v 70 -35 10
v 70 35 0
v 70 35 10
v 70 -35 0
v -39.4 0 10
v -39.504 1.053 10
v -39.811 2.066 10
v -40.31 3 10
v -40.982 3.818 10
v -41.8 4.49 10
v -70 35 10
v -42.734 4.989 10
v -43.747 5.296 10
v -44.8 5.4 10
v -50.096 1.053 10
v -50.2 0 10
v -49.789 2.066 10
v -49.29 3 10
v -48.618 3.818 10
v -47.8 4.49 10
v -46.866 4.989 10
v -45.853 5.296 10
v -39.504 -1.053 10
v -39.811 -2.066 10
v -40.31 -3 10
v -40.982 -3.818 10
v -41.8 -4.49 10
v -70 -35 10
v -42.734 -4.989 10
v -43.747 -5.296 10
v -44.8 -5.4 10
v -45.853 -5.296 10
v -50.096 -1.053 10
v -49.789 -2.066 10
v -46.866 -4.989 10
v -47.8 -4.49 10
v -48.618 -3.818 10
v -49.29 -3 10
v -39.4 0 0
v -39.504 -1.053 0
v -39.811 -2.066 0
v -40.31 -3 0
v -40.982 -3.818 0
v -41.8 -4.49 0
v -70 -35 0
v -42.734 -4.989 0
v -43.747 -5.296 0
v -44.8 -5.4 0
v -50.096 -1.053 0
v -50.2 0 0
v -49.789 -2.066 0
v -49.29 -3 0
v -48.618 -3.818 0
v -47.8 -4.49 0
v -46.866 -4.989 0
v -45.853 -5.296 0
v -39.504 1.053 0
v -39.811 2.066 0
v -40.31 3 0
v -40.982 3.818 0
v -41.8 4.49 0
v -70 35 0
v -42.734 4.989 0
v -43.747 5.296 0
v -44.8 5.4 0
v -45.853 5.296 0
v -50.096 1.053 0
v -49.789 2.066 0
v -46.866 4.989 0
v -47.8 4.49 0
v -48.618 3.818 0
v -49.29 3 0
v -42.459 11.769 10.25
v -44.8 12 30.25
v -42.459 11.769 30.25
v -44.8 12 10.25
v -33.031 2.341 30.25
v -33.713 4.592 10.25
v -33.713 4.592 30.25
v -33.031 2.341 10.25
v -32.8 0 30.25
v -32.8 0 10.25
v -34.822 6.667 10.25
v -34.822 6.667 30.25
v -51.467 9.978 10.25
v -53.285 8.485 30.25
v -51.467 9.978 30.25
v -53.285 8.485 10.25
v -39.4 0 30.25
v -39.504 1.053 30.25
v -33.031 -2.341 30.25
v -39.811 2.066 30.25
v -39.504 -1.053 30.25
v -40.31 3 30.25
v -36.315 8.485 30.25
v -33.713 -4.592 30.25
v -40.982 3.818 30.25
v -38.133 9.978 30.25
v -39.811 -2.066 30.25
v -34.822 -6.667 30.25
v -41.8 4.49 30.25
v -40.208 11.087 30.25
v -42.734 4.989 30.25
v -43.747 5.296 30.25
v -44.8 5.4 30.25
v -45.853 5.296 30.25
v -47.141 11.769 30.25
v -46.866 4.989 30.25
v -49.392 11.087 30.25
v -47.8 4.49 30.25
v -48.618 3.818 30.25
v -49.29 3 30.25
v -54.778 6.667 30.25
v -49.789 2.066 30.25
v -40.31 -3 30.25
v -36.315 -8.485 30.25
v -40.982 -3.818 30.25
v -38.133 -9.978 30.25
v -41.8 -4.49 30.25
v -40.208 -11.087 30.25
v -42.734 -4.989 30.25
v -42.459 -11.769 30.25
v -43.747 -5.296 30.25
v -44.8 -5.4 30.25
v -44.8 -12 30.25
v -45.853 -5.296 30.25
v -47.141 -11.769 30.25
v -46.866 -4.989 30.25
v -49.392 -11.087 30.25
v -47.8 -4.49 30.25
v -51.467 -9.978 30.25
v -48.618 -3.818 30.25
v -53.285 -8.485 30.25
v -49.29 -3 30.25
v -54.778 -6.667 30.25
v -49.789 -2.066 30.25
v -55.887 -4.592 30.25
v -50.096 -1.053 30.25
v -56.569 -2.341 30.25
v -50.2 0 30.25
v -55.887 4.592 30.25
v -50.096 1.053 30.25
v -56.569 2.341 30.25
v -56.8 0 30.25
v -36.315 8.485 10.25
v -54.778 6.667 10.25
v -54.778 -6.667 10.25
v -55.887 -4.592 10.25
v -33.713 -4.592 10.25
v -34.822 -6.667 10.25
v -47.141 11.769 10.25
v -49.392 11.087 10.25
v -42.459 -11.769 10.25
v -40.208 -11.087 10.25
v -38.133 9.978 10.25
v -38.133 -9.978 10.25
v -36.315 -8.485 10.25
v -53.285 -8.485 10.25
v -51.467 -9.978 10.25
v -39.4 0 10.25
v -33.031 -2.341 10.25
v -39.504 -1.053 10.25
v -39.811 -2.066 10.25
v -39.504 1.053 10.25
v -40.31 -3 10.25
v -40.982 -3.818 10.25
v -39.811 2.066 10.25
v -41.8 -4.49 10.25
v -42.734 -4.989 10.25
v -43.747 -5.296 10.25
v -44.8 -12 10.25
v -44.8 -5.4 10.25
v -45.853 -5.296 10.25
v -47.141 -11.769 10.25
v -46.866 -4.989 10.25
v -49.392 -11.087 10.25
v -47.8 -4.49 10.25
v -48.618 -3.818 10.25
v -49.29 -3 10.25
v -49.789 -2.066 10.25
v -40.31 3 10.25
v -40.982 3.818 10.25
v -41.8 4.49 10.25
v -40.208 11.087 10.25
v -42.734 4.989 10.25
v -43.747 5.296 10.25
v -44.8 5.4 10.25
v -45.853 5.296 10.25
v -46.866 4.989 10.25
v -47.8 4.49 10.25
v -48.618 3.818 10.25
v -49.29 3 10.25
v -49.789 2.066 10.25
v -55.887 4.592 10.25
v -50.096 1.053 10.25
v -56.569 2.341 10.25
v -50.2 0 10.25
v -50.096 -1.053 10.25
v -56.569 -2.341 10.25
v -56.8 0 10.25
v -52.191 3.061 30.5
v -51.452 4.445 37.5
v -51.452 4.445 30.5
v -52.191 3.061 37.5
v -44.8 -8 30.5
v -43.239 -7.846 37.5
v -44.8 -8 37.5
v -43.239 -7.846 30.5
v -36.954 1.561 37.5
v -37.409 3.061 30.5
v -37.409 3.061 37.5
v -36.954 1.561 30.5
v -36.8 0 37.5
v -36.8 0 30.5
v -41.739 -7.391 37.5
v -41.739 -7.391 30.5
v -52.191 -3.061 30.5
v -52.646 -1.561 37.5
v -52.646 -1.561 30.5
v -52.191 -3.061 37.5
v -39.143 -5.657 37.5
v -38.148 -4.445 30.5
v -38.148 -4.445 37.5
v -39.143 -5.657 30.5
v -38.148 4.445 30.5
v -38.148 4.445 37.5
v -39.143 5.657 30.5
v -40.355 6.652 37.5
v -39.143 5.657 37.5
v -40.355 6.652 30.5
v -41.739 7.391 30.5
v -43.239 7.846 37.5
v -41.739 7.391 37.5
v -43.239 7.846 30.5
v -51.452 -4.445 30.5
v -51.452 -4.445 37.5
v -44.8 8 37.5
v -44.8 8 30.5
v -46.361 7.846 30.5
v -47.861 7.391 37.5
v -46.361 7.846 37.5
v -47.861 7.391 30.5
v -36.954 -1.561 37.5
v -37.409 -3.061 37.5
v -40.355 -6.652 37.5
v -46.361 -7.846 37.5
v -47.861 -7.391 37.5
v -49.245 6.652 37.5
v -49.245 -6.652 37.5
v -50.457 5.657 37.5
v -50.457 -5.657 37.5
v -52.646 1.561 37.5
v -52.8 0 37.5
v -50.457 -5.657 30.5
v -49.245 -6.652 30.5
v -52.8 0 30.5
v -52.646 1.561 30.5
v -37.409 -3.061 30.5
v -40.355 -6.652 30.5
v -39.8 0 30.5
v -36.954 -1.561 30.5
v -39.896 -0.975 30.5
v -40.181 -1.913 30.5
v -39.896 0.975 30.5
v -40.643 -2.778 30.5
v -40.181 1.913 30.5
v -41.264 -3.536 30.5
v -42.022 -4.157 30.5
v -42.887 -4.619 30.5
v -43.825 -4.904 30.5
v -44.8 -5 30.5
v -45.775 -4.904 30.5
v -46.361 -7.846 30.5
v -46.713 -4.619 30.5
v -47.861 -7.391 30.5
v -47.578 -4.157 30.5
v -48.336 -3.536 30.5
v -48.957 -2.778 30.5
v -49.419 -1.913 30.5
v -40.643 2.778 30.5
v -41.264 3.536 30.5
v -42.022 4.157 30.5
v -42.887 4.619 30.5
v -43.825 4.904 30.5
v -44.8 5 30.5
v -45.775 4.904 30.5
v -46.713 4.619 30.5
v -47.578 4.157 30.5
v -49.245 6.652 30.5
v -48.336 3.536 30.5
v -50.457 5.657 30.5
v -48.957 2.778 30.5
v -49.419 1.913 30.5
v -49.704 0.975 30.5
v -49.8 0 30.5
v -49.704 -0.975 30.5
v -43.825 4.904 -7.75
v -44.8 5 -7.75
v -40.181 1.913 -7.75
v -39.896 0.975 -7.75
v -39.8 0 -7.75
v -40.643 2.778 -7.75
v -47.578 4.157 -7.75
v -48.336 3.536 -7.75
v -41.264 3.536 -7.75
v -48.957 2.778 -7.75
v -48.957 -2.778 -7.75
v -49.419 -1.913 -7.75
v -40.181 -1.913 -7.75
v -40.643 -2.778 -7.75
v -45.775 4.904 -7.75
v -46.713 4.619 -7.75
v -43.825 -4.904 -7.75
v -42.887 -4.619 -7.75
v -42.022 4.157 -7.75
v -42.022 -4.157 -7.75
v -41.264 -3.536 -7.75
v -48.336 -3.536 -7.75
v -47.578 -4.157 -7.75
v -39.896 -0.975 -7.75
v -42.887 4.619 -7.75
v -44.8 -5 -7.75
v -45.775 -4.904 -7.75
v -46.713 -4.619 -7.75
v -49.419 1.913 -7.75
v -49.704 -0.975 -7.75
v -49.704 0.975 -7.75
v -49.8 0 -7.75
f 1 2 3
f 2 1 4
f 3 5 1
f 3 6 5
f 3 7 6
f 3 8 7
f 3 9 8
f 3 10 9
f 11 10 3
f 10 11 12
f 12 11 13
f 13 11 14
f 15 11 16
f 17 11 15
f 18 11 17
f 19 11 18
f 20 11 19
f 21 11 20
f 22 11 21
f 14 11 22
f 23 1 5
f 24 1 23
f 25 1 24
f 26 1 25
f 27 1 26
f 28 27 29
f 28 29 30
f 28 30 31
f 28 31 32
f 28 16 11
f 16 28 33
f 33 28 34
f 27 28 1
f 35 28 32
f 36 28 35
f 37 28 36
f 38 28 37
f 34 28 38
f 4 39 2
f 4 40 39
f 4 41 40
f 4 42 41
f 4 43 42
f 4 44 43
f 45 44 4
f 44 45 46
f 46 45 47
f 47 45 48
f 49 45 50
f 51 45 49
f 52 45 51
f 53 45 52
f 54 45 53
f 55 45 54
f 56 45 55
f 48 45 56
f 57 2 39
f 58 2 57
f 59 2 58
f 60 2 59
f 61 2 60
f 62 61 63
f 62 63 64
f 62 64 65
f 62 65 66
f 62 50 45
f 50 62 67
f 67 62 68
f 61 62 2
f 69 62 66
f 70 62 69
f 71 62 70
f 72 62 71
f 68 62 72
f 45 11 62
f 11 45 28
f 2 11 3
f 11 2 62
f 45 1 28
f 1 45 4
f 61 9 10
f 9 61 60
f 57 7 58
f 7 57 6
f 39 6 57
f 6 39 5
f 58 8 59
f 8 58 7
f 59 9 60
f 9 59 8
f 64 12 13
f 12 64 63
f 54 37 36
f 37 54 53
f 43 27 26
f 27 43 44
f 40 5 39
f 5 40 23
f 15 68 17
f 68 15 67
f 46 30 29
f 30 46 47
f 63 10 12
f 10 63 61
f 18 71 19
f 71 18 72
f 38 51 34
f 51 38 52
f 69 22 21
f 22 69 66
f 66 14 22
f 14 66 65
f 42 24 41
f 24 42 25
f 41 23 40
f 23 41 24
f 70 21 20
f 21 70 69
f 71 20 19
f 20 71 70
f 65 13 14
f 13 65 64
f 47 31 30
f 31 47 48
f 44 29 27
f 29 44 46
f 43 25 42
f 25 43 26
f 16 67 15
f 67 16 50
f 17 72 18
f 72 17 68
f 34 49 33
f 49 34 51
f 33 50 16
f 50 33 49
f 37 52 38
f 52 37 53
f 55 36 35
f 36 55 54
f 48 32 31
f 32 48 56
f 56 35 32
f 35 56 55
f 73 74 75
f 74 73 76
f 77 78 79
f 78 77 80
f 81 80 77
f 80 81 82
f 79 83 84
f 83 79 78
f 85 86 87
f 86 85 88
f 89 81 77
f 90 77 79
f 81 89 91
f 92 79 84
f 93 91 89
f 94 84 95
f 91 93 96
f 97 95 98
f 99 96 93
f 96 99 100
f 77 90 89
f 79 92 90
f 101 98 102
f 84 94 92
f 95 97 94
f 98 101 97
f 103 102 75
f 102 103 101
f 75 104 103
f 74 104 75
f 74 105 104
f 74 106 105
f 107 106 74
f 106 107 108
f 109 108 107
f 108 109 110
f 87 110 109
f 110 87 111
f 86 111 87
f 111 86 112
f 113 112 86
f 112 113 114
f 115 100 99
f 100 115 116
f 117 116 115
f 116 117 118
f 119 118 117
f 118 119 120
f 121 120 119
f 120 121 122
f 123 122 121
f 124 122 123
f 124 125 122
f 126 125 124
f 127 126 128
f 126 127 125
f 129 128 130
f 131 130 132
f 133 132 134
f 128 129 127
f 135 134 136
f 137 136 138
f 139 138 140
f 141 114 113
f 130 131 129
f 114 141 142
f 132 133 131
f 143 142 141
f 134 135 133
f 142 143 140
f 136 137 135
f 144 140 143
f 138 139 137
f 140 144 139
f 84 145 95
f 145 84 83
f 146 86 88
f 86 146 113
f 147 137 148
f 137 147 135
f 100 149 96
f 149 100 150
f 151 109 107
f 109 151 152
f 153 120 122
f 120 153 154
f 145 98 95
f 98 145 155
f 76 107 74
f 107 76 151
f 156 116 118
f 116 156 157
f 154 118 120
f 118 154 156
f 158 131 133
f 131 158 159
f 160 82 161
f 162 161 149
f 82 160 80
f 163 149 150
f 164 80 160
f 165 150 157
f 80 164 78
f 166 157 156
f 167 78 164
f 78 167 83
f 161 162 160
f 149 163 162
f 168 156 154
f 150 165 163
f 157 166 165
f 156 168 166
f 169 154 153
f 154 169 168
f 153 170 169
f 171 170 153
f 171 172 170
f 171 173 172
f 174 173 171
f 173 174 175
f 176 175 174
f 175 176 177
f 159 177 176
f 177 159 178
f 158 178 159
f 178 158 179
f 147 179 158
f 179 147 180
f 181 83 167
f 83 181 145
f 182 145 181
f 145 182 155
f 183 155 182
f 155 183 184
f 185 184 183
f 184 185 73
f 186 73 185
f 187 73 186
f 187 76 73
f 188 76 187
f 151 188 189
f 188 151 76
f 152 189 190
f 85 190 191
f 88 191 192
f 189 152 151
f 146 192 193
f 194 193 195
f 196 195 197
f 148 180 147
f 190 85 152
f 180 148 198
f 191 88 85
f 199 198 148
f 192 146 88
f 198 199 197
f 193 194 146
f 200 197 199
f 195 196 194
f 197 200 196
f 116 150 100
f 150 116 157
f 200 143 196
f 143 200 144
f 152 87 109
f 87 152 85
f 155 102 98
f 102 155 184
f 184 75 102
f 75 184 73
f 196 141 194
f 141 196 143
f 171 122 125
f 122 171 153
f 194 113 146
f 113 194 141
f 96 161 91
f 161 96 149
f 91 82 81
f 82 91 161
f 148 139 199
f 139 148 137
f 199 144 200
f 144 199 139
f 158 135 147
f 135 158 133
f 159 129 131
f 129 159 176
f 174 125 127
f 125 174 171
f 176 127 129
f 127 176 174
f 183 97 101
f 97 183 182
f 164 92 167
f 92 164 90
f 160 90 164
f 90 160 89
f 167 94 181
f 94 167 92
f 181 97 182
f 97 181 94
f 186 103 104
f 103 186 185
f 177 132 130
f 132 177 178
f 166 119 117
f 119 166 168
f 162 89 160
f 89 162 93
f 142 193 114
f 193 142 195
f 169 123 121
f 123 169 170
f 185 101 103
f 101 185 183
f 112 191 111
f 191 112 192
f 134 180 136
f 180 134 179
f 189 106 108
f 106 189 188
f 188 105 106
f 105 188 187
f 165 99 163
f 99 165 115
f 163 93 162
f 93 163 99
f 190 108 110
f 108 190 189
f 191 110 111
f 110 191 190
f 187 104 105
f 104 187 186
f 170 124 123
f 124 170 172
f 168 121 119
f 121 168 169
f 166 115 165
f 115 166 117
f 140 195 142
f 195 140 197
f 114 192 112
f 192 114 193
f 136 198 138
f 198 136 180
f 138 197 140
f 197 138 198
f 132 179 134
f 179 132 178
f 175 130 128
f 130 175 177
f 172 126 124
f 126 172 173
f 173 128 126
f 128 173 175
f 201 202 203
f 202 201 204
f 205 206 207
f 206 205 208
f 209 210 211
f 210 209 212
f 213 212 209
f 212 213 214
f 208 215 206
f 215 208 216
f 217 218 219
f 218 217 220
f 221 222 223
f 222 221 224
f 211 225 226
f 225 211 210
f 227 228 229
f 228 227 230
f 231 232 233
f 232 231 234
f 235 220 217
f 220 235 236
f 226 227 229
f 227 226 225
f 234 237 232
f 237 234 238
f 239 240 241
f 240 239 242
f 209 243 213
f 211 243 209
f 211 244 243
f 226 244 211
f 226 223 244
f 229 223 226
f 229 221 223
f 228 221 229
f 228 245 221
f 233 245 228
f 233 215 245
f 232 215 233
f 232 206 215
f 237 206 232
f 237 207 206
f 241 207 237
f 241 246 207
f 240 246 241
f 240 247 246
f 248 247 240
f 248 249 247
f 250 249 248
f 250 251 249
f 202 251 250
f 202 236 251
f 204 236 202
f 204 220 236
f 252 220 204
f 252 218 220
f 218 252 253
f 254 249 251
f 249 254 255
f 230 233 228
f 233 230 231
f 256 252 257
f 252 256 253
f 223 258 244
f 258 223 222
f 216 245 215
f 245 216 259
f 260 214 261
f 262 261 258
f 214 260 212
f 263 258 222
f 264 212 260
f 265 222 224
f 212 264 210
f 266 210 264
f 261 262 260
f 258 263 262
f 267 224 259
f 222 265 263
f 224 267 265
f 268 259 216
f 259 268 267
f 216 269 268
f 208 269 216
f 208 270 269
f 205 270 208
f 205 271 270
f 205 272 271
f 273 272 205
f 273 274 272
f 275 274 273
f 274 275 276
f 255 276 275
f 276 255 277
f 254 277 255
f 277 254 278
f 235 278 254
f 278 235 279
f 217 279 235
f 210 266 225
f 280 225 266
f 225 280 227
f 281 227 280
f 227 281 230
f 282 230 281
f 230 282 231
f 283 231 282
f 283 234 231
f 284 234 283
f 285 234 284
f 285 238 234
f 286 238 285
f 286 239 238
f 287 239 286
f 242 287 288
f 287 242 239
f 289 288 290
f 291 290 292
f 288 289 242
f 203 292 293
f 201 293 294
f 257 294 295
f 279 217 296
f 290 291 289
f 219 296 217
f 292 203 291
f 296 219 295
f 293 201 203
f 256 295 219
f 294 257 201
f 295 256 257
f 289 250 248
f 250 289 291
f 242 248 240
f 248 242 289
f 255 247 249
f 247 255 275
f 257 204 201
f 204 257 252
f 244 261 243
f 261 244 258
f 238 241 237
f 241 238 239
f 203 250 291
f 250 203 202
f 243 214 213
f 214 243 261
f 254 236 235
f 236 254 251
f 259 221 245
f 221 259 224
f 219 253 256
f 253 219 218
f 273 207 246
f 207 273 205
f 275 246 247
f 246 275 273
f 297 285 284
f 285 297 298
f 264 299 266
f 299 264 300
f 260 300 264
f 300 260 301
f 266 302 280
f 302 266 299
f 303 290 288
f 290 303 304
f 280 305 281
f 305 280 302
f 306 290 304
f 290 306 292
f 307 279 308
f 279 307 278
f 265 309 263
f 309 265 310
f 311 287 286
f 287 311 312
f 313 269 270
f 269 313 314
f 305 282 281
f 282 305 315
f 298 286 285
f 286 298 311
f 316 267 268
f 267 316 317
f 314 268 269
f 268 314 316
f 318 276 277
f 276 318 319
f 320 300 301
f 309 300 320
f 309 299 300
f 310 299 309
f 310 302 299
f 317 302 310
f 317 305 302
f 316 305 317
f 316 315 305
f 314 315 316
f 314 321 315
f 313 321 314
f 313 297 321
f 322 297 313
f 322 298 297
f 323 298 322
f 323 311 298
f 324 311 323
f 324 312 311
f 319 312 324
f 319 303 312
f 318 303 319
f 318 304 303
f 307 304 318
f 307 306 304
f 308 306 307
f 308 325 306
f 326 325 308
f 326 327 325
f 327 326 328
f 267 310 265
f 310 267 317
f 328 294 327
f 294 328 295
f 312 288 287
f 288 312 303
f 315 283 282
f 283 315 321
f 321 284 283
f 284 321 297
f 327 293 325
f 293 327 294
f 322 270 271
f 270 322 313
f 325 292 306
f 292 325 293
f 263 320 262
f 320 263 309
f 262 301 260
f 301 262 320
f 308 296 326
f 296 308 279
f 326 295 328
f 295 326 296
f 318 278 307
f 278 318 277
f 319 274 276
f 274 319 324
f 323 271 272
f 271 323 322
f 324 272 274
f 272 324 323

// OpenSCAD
$fn = 32;

// ------------------------------------------------------------------------
// Standoff columns: 1 d24 standoffs, bolts d10
// Every part is its own module, assembly() places them once.
// ------------------------------------------------------------------------

// --- part 1 ---
module base_plate() {
  difference() {
    translate([-70, -35, 0]) cube([140, 70, 10]);
    translate([-44.8, 0, -1]) cylinder(h = 12, d = 10.8);
  }
}

// --- part 2 ---
module spacer() {
  difference() {
      translate([0, 0, 0]) cylinder(h = 20, d = 24);
      translate([0, 0, -1]) cylinder(h = 22, d = 10.8);
    }
}

// --- part 3 ---
module bolt() {
  cylinder(h = 7, d = 16);
  translate([0, 0, -38.25]) cylinder(h = 38.25, d = 10);
}

// --- assembly ---
module assembly() {
  translate([0, 0, 0]) rotate([0, 0, 0]) base_plate();
  translate([-44.8, 0, 10.25]) rotate([0, 0, 0]) spacer();
  translate([-44.8, 0, 30.5]) rotate([0, 0, 0]) bolt();
}

assembly();
